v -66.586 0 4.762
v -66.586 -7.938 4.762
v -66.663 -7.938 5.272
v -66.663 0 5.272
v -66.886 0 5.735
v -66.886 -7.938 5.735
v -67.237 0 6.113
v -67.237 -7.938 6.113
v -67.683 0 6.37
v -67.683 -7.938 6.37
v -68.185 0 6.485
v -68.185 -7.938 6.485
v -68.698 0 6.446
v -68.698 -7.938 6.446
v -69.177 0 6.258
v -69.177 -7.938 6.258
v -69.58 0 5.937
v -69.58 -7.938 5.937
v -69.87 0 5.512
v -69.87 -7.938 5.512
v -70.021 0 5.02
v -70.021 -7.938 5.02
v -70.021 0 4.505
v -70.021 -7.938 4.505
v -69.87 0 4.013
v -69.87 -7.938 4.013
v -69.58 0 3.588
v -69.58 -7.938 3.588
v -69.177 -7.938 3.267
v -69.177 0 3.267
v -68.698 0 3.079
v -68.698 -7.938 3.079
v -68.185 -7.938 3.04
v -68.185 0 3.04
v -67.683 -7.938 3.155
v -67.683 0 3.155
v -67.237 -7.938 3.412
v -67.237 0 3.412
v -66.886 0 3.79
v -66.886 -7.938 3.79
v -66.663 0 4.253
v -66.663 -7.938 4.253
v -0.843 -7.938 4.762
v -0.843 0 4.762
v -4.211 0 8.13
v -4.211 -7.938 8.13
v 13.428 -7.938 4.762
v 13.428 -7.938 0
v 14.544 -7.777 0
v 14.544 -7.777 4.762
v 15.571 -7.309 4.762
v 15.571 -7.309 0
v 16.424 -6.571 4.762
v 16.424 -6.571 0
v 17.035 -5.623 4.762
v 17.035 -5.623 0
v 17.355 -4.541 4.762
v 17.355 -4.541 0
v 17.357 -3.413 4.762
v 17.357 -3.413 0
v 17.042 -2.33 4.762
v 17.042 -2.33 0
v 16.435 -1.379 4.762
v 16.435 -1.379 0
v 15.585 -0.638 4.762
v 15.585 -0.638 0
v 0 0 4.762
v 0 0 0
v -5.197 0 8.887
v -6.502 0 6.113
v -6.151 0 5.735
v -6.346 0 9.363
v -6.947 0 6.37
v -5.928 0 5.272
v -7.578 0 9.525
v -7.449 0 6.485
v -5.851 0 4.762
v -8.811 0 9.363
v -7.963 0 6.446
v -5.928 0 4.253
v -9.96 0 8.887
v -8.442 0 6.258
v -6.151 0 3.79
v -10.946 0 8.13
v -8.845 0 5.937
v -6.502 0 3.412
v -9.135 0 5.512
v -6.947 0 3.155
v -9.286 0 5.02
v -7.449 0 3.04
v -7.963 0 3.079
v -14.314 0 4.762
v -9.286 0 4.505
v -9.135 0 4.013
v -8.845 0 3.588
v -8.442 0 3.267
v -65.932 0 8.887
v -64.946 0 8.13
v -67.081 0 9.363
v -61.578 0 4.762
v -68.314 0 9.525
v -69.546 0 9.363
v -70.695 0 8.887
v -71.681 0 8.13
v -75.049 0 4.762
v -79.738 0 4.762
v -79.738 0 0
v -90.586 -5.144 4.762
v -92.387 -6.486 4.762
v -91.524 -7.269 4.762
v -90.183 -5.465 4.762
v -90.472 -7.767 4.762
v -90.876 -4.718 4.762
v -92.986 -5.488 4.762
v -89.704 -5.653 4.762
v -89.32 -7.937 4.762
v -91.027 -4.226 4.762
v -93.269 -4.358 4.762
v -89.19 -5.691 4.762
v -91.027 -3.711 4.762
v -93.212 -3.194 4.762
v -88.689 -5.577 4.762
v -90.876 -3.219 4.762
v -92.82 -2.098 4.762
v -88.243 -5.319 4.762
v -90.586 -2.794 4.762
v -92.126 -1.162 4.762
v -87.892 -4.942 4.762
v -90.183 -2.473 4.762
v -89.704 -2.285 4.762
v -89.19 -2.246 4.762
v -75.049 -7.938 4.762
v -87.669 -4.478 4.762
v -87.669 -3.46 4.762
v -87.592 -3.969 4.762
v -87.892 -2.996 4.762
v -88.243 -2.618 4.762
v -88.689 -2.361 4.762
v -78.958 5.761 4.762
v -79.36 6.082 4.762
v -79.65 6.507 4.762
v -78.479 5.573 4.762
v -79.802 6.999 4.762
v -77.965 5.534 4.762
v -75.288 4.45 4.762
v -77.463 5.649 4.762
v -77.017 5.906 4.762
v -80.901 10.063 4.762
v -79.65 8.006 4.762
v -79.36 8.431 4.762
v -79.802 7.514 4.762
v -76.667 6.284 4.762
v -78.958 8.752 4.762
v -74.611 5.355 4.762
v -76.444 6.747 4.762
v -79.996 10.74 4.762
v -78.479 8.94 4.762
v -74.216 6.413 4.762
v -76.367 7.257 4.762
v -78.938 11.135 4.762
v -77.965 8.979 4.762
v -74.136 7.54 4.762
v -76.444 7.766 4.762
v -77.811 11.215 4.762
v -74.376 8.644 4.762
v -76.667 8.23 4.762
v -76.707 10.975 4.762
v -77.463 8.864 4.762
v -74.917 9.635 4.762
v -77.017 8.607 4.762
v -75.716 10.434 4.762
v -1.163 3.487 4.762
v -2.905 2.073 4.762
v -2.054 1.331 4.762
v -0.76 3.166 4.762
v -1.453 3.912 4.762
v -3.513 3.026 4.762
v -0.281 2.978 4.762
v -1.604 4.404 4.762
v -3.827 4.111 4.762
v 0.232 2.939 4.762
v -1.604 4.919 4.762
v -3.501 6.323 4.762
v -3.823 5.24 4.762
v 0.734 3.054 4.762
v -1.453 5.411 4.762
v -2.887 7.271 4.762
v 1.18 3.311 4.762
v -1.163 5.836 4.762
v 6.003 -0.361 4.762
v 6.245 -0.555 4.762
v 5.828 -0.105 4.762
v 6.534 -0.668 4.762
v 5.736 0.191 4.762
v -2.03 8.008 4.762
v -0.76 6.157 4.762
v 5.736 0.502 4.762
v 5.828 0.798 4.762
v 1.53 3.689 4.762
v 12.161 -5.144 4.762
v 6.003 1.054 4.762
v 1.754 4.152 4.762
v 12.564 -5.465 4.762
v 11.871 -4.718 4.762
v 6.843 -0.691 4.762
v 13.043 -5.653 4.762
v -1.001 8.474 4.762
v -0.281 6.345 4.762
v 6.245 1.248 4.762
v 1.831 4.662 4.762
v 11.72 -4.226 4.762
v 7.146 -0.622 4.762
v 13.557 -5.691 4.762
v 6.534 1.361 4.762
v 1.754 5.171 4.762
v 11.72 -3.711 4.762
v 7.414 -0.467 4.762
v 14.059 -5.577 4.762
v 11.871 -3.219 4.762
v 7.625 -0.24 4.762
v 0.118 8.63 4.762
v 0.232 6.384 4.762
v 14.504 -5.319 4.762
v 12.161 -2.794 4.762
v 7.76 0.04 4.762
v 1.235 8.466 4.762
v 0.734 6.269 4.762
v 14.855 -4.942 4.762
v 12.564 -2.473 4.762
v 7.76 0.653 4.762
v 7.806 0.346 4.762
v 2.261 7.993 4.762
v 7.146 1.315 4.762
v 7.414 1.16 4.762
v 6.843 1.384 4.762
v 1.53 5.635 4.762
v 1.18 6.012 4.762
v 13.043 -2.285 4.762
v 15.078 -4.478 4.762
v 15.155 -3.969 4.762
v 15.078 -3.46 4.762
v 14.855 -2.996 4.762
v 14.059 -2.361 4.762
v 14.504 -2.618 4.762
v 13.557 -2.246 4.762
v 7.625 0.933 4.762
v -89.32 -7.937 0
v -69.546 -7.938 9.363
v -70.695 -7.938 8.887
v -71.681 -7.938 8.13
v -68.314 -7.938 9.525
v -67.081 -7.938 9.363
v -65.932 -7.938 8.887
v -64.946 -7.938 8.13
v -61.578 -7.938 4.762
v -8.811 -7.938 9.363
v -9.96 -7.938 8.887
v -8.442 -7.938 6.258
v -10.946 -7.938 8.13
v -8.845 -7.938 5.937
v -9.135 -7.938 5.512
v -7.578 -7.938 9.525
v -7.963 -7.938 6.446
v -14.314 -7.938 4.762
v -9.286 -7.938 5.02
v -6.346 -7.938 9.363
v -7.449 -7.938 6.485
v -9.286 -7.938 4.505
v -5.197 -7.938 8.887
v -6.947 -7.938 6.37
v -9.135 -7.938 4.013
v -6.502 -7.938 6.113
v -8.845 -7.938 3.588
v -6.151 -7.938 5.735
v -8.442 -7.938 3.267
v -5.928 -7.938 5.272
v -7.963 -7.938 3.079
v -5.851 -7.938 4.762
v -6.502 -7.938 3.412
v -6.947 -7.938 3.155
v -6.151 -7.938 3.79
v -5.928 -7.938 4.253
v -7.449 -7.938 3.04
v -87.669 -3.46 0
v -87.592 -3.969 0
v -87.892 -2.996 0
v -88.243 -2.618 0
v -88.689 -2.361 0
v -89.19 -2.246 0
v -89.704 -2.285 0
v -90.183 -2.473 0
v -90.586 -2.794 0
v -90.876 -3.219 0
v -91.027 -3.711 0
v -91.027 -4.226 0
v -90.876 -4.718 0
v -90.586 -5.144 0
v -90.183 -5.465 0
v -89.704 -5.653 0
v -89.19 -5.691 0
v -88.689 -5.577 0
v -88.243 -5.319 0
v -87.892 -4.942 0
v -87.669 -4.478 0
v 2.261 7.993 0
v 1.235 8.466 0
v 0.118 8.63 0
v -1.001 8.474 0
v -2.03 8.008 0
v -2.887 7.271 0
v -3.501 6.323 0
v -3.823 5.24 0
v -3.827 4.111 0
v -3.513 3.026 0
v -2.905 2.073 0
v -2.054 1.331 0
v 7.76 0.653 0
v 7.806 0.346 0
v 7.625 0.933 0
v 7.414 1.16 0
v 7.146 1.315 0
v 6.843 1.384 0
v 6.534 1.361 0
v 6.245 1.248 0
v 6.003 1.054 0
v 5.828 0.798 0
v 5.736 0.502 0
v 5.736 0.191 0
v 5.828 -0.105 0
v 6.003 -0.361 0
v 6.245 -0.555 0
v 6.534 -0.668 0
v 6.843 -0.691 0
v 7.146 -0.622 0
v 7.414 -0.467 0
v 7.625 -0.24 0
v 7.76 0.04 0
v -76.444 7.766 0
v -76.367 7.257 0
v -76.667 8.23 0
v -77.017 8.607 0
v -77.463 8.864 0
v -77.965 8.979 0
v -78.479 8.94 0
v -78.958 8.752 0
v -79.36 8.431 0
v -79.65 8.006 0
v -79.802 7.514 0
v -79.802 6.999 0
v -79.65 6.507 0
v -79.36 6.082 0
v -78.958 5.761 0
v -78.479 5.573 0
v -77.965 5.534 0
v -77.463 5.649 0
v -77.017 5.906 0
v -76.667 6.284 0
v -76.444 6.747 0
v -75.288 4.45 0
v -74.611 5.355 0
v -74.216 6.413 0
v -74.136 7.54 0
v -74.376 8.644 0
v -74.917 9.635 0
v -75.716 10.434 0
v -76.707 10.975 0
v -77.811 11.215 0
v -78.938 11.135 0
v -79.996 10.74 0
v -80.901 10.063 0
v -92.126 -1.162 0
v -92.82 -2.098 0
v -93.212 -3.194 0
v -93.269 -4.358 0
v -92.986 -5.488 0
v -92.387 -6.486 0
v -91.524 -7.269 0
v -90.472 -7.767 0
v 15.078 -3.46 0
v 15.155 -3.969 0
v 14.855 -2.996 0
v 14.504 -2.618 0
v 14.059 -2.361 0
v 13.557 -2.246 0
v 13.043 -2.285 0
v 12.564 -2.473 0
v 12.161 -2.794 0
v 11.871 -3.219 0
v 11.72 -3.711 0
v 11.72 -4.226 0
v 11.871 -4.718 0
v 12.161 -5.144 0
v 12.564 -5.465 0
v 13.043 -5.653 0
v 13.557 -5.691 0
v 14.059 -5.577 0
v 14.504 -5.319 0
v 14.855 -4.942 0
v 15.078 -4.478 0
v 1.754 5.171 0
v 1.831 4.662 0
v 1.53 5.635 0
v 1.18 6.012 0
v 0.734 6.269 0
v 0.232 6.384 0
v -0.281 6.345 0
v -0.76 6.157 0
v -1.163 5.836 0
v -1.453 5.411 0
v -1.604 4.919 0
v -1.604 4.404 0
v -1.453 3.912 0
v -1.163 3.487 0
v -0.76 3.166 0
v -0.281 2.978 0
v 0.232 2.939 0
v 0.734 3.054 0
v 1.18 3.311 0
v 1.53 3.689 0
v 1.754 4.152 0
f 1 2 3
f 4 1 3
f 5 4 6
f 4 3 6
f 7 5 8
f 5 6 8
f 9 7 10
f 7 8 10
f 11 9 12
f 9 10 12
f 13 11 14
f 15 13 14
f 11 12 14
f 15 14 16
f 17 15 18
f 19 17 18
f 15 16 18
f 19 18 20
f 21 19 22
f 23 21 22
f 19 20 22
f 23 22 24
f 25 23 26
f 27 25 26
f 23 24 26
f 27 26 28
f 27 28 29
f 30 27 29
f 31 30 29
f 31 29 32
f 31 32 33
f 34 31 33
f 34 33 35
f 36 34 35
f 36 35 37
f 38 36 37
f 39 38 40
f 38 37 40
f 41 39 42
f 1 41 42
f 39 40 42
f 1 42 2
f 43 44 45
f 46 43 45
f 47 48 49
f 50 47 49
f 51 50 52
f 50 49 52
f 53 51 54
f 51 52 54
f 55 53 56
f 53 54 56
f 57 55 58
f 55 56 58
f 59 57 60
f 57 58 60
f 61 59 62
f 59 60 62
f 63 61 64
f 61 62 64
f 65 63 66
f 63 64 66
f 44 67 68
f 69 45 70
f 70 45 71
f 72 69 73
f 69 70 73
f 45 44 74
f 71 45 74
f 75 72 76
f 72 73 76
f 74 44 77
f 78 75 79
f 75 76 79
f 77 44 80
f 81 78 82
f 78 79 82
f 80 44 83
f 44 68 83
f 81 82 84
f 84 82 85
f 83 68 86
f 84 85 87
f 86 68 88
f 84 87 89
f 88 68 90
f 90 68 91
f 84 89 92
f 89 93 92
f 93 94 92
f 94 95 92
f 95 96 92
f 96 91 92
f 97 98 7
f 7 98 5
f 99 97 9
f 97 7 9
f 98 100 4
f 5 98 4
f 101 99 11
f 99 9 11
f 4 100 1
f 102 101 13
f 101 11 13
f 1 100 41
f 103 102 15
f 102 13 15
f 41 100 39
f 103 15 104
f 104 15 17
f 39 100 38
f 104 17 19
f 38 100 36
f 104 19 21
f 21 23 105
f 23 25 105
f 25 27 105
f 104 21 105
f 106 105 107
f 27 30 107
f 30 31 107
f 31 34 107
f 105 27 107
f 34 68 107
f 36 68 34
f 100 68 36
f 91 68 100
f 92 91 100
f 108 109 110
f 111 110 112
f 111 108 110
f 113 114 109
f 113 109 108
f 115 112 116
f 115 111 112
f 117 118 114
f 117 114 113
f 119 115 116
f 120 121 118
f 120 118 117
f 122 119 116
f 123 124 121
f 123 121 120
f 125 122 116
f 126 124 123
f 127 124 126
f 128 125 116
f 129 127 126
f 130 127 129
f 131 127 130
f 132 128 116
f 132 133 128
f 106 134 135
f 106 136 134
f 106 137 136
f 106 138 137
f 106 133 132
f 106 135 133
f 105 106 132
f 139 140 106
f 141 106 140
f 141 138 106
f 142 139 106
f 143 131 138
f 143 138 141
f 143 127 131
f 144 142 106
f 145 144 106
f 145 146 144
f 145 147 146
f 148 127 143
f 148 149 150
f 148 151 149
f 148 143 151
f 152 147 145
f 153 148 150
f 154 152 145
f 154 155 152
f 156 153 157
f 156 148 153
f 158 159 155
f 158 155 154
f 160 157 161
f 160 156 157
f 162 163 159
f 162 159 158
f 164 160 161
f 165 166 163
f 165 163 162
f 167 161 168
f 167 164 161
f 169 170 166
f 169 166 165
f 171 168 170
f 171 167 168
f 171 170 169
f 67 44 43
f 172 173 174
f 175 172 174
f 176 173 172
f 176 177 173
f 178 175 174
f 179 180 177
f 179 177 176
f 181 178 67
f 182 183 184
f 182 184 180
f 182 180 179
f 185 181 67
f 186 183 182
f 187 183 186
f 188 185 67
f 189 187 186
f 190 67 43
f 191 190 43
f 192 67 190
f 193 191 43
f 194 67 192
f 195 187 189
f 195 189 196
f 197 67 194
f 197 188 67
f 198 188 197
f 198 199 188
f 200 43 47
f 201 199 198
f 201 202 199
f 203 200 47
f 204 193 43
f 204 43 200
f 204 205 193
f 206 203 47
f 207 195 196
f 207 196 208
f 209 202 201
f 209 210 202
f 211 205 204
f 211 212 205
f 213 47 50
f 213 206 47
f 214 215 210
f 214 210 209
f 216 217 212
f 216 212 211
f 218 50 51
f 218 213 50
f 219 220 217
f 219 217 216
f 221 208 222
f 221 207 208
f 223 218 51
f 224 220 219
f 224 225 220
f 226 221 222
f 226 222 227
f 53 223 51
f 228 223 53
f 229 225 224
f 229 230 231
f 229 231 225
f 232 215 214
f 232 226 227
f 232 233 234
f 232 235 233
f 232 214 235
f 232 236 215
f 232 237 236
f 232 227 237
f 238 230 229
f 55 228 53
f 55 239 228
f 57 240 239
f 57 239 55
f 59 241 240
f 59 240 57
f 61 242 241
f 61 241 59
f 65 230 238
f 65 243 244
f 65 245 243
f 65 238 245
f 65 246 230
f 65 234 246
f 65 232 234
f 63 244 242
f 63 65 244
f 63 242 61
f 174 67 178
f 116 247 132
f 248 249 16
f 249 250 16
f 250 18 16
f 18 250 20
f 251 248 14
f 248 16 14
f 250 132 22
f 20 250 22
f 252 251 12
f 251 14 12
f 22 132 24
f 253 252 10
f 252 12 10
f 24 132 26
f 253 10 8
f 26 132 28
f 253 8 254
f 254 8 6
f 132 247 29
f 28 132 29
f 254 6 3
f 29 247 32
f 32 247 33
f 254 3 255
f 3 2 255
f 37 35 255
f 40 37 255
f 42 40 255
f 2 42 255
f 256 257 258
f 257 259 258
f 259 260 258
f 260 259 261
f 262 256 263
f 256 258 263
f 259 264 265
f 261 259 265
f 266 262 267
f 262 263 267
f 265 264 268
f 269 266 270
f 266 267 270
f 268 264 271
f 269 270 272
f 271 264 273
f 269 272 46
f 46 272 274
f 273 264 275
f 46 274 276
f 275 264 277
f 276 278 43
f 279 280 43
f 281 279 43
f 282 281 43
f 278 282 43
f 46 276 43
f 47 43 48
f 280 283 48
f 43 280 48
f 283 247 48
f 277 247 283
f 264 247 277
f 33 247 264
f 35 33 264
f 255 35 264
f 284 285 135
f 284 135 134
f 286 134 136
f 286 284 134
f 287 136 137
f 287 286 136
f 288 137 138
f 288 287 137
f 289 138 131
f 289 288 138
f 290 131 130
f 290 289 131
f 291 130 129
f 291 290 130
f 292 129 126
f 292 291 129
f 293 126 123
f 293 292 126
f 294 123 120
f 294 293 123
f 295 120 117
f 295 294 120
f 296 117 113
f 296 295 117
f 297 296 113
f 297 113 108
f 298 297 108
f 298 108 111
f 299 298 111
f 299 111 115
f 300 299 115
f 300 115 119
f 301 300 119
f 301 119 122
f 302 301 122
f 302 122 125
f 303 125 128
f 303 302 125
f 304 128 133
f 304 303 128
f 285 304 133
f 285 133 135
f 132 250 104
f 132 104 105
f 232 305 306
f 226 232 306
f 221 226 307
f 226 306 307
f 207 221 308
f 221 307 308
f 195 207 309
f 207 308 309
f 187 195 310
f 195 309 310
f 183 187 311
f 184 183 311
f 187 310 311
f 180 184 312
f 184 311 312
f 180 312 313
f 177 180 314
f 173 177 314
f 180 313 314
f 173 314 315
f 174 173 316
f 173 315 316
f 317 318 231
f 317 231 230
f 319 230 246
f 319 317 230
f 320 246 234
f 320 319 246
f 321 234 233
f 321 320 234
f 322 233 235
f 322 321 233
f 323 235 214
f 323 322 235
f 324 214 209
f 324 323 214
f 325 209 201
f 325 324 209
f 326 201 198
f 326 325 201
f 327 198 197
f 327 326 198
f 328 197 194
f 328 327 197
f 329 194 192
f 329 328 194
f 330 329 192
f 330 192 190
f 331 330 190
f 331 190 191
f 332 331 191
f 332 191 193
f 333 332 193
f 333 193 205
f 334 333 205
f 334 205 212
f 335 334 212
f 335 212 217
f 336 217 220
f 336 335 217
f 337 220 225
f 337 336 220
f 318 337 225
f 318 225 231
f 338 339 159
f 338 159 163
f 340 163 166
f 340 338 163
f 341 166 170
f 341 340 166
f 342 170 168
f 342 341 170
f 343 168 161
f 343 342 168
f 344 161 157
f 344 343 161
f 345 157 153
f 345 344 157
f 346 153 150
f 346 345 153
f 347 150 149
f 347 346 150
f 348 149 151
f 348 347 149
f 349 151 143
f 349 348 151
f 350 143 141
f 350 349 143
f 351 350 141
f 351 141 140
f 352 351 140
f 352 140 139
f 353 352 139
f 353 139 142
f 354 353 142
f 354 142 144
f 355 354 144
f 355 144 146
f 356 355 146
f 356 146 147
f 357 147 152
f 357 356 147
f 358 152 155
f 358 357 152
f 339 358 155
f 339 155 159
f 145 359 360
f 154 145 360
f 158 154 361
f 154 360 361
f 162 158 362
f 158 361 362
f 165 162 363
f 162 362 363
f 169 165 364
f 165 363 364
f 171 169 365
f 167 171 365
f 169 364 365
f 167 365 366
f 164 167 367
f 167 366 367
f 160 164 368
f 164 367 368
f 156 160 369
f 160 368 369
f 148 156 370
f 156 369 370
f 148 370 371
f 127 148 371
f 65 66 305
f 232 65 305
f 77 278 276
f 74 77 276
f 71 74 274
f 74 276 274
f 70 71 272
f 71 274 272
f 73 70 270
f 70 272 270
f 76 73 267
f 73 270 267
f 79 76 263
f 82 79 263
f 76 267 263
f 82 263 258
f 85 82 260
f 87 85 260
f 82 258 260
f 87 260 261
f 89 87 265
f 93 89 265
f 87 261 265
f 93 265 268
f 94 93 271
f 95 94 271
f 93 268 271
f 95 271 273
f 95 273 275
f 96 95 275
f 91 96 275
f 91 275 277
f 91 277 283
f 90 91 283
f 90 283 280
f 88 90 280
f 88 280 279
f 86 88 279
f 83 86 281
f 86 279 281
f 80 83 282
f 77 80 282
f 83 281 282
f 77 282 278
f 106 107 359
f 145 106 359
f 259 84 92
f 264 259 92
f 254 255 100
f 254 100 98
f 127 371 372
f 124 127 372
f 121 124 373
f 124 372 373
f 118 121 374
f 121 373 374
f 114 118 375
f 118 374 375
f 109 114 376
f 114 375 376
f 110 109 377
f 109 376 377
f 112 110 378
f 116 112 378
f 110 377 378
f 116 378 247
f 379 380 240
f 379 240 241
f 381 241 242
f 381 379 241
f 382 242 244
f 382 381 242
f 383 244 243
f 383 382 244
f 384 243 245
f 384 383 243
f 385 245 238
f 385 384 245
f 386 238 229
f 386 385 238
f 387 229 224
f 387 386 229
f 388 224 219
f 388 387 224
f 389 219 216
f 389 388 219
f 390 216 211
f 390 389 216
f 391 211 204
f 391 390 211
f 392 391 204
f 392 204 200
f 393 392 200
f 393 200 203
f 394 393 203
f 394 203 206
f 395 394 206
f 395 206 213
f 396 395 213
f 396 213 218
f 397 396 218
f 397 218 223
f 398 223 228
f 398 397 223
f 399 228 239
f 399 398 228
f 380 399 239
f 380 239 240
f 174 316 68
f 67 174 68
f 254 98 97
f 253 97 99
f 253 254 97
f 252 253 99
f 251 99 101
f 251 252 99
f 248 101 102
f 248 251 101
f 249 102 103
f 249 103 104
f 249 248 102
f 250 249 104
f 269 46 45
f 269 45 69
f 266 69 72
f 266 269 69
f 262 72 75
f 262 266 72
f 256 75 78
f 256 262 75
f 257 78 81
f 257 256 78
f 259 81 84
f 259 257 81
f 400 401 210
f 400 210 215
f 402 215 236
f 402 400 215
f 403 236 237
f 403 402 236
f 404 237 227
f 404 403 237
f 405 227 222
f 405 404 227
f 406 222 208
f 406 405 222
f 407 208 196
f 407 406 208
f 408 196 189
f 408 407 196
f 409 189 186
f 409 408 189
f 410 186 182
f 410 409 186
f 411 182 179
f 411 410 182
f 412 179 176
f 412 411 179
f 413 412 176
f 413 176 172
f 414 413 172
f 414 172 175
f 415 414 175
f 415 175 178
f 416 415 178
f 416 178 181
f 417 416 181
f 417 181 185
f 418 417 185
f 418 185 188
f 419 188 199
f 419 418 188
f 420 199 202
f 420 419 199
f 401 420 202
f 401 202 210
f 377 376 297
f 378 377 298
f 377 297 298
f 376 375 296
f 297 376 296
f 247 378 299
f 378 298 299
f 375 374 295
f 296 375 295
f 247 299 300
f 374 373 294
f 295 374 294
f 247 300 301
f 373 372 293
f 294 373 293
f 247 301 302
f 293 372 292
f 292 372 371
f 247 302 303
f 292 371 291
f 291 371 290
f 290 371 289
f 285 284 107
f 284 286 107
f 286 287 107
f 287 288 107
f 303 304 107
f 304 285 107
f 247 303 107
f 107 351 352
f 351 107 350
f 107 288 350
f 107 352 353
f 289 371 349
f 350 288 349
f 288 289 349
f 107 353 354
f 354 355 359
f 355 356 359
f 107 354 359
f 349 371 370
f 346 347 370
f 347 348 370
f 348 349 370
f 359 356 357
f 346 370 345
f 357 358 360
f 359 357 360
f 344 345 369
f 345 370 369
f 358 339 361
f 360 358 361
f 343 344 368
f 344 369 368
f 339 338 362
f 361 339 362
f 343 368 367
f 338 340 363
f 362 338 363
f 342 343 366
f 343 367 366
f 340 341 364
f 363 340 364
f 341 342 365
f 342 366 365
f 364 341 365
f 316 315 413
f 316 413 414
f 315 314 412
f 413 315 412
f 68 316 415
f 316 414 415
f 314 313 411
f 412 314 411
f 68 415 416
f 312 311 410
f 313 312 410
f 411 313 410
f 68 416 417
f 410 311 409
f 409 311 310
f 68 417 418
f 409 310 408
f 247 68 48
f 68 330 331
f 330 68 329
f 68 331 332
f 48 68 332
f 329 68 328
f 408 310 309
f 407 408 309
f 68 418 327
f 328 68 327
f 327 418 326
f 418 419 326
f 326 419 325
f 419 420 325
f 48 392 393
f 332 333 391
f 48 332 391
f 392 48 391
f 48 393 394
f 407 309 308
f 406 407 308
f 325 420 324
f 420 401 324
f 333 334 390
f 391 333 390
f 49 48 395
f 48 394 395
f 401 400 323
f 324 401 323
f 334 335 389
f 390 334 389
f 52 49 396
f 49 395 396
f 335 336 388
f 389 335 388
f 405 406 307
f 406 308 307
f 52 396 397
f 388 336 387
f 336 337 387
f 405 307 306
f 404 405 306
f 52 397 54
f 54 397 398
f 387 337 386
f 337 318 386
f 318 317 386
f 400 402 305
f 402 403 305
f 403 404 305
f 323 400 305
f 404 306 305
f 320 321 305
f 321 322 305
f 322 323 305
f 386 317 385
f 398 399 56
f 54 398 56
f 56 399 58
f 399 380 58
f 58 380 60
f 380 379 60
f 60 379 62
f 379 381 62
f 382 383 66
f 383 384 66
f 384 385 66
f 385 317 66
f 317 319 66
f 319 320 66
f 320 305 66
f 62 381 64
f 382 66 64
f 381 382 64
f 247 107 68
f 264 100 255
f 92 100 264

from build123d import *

# Parameters (mm, degrees)
F0_R     = 1.7272
F0_R_2   = 1.0407250193
F1_DEPTH = 4.7625
F3_DEPTH = 7.9375
F4_R     = 1.7272
F5_DEPTH = 7.9375


with BuildPart() as f1:
    # F0 (on Top) → F1 (new body)
    with BuildSketch(Plane.XY):
        with BuildLine():
            Line((-2.0541653616, 1.330521752), (0, 0))
            Line((0, 0), (-79.738154648, 0))
            Line((-79.738154648, 0), (-75.2879145345, 4.4502401135))
            ThreePointArc((-75.2879145345, 4.4502401135), (-75.2879145345, 10.0629001892), (-80.9005746101, 10.0629001892))
            Line((-80.9005746101, 10.0629001892), (-92.1258947615, -1.1624199622))
            ThreePointArc((-92.1258947615, -1.1624199622), (-92.9862116183, -5.4875248722), (-89.3195647236, -7.9375))
            Line((-89.3195647236, -7.9375), (13.4275761574, -7.9375))
            ThreePointArc((13.4275761574, -7.9375), (17.2335612406, -5.093674046), (15.5851543061, -0.6377091574))
            Line((15.5851543061, -0.6377091574), (2.2609909357, 7.9926034372))
            ThreePointArc((2.2609909357, 7.9926034372), (-3.2276280555, 6.8191407432), (-2.0541653616, 1.330521752))
        make_face()
        with Locations((-89.3195647236, -3.96875)):
            Circle(F0_R, mode=Mode.SUBTRACT)
        with Locations((13.4275761574, -3.96875)):
            Circle(F0_R, mode=Mode.SUBTRACT)
        with Locations((6.7654944722, 0.3464062973)):
            Circle(F0_R_2, mode=Mode.SUBTRACT)
        with Locations((-78.0942445723, 7.2565701513)):
            Circle(F0_R, mode=Mode.SUBTRACT)
        with Locations((0.1034127871, 4.6615625946)):
            Circle(F0_R, mode=Mode.SUBTRACT)
    extrude(amount=F1_DEPTH)

    # F2 (on face) → F3 (join, through all)
    with BuildSketch(Plane.XZ.offset(7.9375)):
        with BuildLine():
            Line((-75.0487659739, 4.7625), (-68.3135738831, 4.7625))
            Line((-68.3135738831, 4.7625), (-61.5783817923, 4.7625))
            Line((-61.5783817923, 4.7625), (-64.9459778377, 8.1300960454))
            ThreePointArc((-64.9459778377, 8.1300960454), (-68.3135738831, 9.525), (-71.6811699285, 8.1300960454))
            Line((-71.6811699285, 8.1300960454), (-75.0487659739, 4.7625))
        make_face()
        with BuildLine():
            Line((-14.3136067739, 4.7625), (-7.5784146831, 4.7625))
            Line((-7.5784146831, 4.7625), (-0.8432225923, 4.7625))
            Line((-0.8432225923, 4.7625), (-4.2108186377, 8.1300960454))
            ThreePointArc((-4.2108186377, 8.1300960454), (-7.5784146831, 9.525), (-10.9460107285, 8.1300960454))
            Line((-10.9460107285, 8.1300960454), (-14.3136067739, 4.7625))
        make_face()
    extrude(amount=-F3_DEPTH)

    # F4 (on face) → F5 (cut, through all)
    with BuildSketch(Plane.XZ.offset(7.9375)):
        with Locations((-68.3135738831, 4.7625)):
            Circle(F4_R)
        with Locations((-7.5784146831, 4.7625)):
            Circle(F4_R)
    extrude(amount=-F5_DEPTH, mode=Mode.SUBTRACT)


solid = f1.part
